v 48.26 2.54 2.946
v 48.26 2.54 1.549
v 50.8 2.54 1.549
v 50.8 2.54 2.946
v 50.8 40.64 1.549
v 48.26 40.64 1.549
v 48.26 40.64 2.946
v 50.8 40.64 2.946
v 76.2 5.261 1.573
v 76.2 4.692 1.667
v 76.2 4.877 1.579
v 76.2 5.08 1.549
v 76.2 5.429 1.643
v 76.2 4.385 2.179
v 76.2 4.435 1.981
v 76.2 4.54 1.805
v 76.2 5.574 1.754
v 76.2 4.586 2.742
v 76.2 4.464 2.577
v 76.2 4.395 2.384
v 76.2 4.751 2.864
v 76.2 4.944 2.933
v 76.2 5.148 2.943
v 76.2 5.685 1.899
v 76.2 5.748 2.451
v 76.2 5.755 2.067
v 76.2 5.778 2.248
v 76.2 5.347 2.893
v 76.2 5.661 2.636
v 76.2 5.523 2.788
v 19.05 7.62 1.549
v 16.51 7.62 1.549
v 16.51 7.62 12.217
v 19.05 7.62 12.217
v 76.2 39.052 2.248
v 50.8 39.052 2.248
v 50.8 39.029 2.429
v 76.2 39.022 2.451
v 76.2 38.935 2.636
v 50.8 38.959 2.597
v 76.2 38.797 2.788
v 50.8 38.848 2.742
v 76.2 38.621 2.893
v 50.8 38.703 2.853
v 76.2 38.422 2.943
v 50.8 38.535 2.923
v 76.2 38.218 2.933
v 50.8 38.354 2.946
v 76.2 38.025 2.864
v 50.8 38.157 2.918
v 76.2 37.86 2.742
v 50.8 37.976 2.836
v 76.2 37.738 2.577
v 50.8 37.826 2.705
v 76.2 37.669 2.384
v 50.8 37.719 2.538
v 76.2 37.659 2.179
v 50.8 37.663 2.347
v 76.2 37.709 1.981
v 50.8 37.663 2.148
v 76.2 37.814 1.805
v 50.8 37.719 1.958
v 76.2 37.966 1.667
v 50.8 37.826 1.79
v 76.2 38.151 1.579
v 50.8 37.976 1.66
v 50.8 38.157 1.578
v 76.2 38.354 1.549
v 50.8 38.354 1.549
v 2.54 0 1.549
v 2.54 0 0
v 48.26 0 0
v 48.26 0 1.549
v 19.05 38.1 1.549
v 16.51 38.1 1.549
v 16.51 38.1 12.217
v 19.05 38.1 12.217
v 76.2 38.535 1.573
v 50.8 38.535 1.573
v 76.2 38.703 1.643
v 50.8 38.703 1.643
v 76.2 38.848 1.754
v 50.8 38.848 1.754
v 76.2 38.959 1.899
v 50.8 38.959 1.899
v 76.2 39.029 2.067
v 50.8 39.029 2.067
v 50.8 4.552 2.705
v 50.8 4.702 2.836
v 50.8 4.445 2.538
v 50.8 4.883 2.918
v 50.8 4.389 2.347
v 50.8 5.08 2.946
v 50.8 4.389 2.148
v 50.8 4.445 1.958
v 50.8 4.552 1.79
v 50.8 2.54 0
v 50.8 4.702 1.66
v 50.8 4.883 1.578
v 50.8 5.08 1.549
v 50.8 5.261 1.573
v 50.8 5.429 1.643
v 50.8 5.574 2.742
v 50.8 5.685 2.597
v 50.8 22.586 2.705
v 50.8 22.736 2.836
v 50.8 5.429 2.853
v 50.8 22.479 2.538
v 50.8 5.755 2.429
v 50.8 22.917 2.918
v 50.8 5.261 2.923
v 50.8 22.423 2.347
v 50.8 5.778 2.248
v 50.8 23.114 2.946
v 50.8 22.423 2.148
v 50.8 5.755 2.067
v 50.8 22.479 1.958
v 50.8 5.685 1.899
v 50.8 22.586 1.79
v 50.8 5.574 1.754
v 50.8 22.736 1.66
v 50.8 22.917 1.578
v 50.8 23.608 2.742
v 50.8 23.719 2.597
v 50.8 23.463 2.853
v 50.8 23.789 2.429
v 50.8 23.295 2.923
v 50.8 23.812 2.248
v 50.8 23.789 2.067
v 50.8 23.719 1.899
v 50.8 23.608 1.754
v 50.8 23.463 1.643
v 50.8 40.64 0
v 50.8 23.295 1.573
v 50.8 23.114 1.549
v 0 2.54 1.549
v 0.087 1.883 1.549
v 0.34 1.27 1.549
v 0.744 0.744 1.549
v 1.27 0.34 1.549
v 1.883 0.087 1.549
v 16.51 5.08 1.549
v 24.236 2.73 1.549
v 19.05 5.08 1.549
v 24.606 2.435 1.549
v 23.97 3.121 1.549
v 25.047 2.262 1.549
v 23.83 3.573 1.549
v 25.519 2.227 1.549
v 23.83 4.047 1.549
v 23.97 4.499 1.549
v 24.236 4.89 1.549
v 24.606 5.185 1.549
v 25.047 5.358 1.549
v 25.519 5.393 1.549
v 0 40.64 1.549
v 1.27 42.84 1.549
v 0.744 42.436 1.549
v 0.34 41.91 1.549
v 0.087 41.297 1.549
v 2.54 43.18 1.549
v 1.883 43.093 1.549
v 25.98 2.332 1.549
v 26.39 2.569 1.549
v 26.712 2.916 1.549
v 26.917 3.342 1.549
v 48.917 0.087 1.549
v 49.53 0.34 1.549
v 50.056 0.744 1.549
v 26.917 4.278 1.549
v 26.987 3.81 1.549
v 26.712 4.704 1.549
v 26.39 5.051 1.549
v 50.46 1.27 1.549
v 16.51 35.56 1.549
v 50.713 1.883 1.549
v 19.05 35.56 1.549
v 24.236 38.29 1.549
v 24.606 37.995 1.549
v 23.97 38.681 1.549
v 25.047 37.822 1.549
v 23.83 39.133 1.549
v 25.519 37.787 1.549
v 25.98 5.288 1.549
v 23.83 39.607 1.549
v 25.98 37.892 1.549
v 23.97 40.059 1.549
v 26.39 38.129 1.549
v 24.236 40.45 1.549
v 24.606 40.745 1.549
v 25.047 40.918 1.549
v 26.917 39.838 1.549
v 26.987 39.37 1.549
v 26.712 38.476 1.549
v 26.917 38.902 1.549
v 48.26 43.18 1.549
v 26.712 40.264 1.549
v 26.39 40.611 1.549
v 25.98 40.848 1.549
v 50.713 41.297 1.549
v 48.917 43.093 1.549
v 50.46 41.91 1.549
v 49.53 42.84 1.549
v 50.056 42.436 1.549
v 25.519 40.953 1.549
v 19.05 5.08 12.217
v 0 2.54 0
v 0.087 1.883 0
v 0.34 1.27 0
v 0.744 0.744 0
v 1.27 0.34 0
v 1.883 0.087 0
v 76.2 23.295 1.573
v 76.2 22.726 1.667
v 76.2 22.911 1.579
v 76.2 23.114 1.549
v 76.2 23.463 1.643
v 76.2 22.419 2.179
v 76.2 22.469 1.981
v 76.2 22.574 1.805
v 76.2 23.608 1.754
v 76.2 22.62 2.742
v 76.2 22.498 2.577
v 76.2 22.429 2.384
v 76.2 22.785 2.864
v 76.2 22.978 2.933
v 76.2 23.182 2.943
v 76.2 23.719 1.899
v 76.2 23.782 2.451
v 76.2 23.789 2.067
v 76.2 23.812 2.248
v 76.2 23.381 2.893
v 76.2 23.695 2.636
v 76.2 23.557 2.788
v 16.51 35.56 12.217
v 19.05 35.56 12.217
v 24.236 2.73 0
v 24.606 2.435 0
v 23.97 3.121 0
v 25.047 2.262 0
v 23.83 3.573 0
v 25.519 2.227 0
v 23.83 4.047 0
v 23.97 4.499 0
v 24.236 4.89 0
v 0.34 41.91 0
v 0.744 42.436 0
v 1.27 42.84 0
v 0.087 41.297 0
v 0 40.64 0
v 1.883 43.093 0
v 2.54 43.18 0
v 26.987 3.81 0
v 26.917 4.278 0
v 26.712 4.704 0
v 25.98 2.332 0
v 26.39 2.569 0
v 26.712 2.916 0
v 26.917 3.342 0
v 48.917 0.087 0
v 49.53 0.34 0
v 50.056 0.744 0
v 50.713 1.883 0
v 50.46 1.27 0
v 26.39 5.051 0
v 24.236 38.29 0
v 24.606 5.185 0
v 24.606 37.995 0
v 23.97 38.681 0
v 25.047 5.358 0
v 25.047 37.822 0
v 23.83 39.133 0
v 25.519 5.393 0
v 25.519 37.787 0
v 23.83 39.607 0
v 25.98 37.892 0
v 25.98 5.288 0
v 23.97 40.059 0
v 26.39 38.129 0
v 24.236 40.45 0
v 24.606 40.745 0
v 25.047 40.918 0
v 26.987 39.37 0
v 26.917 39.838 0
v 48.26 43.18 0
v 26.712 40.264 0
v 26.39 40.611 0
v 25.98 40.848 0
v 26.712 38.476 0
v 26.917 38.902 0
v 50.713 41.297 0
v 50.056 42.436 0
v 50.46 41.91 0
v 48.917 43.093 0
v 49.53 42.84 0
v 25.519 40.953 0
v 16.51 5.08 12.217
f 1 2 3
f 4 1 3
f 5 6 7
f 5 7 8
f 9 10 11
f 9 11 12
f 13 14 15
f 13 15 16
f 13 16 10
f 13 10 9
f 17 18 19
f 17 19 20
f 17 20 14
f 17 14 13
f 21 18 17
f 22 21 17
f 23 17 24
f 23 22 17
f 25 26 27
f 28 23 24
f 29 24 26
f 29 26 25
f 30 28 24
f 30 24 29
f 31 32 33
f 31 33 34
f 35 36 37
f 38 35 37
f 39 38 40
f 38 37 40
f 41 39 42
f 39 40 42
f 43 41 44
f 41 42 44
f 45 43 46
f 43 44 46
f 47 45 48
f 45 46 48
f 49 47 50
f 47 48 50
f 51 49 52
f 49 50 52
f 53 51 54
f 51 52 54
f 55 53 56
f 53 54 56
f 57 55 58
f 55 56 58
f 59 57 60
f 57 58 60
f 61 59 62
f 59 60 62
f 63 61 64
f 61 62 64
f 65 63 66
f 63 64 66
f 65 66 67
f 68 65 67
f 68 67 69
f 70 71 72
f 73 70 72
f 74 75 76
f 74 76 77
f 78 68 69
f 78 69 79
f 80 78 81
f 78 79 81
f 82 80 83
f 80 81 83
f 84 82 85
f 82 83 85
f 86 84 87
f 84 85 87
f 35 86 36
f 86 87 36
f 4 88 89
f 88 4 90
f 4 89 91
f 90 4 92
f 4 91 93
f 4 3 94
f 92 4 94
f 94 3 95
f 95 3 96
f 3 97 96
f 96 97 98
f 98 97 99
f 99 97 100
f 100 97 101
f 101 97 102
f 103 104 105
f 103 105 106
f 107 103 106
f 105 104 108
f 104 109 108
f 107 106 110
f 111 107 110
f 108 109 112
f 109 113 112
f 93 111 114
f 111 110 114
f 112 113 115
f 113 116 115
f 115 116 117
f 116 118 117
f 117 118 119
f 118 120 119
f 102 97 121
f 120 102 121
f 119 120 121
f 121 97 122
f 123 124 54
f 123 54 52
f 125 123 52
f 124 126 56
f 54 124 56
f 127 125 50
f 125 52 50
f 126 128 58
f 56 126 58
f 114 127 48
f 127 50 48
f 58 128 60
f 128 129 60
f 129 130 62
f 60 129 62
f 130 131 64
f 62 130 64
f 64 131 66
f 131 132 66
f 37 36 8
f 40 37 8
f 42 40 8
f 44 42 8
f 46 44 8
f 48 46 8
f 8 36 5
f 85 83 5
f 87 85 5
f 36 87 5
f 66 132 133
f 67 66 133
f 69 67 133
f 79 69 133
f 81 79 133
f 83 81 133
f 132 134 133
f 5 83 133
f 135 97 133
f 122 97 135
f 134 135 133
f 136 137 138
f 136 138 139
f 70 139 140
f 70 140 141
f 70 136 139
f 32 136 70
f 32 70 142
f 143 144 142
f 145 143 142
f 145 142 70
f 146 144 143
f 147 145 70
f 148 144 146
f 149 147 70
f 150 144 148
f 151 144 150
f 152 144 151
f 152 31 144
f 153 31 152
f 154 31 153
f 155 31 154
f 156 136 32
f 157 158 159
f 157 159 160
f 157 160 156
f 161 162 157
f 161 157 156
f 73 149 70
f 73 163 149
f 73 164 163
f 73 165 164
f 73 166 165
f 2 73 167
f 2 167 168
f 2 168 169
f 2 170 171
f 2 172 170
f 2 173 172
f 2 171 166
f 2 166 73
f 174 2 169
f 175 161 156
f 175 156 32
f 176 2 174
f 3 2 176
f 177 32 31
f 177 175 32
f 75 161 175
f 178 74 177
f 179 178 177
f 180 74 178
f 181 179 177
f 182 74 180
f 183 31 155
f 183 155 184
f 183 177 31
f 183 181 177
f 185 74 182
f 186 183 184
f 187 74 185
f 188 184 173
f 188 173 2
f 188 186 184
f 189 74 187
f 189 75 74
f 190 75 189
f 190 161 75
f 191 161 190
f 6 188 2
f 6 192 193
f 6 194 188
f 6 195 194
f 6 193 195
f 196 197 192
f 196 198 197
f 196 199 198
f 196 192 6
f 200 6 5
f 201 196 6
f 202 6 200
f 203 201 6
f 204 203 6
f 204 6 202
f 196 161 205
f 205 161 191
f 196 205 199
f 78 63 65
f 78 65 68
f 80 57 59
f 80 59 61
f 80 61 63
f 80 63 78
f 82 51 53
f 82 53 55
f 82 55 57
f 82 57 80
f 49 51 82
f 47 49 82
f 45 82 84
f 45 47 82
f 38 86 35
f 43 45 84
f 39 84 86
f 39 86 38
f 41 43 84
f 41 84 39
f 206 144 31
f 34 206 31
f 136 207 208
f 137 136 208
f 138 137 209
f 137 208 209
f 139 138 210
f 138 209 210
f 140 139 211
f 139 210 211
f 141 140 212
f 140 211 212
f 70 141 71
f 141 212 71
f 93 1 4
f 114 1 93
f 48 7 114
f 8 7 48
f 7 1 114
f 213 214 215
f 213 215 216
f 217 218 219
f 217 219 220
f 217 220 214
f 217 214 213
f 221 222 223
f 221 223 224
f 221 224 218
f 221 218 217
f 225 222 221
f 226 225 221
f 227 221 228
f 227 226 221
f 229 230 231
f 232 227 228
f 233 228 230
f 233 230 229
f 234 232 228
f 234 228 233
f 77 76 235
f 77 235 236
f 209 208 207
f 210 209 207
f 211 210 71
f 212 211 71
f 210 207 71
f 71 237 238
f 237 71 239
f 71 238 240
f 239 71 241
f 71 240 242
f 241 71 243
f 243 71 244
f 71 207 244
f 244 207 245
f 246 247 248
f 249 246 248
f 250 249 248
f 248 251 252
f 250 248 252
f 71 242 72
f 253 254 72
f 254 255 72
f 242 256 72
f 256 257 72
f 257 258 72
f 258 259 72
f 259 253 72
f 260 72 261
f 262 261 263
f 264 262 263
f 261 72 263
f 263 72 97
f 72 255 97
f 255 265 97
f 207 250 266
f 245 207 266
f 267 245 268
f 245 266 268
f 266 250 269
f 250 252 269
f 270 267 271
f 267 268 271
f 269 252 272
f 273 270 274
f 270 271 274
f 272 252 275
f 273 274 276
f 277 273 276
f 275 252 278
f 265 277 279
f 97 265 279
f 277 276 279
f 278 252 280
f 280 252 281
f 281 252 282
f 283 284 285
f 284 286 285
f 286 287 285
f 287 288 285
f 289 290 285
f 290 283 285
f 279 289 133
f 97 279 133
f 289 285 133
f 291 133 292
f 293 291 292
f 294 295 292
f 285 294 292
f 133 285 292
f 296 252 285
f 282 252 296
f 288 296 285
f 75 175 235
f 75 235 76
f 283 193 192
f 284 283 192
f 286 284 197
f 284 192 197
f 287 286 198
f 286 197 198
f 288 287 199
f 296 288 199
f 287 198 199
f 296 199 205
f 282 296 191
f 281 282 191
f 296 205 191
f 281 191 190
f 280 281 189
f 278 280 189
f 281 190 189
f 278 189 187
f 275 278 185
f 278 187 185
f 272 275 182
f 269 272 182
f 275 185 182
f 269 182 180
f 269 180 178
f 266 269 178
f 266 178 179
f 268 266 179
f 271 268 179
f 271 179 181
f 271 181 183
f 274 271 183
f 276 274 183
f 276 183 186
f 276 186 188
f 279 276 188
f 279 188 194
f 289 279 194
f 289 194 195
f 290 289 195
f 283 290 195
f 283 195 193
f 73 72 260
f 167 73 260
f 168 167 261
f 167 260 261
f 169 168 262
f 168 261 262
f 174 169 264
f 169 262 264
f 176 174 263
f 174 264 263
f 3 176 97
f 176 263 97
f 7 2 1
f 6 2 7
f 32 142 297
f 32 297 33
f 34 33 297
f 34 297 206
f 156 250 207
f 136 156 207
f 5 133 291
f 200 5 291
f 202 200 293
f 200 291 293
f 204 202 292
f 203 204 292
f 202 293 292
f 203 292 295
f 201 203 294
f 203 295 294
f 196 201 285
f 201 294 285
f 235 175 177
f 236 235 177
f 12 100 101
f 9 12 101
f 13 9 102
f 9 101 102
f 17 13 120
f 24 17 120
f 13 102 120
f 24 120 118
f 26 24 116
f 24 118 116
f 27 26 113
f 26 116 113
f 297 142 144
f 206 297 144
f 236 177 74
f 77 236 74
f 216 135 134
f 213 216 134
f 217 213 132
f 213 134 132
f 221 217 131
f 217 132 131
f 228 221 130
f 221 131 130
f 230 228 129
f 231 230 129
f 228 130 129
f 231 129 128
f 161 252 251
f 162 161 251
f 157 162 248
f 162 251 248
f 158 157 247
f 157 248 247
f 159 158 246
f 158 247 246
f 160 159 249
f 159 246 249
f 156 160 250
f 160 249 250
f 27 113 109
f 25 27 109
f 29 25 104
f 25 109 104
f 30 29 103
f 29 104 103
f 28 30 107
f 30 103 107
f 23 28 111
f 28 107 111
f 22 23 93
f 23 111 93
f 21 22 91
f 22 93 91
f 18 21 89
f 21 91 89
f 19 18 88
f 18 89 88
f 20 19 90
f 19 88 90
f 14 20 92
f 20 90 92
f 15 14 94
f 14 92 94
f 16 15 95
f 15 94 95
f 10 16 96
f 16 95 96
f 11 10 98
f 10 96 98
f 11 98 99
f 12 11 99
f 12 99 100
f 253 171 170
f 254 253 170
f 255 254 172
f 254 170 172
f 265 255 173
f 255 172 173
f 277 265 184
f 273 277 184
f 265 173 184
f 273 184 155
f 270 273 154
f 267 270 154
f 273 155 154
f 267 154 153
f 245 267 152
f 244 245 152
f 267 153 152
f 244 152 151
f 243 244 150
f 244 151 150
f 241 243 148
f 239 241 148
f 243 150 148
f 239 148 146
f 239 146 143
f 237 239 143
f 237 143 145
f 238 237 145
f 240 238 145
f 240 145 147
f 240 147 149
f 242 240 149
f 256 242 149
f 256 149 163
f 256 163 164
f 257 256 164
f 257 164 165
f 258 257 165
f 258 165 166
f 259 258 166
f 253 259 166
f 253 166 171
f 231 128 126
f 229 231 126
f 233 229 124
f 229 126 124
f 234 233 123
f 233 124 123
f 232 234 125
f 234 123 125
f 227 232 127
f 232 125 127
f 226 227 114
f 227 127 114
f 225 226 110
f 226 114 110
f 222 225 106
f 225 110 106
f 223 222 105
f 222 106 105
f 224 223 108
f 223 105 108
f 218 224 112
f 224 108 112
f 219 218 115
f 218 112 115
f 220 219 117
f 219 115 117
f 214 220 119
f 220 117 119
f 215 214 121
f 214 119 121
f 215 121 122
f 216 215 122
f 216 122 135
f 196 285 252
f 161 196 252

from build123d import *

# Parameters (mm, degrees)
F1_DEPTH = 1.5494
F2_R     = 1.5875
F3_DEPTH = 25.4
F4_W     = 2.54
F4_H     = 2.54
F5_DEPTH = 10.668
F7_W     = 2.54
F7_H     = 38.1
F8_DEPTH = 1.397
F9_DEPTH = 25.4


with BuildPart() as f1:
    # F0 (on Top) → F1 (new body)
    with BuildSketch(Plane.XY):
        with BuildLine():
            ThreePointArc((0, 2.54), (0.743949, 0.743949), (2.54, 0))
            Line((2.54, 0), (48.26, 0))
            ThreePointArc((48.26, 0), (50.056051, 0.743949), (50.8, 2.54))
            Line((50.8, 2.54), (50.8, 40.64))
            ThreePointArc((50.8, 40.64), (50.056051, 42.436051), (48.26, 43.18))
            Line((48.26, 43.18), (2.54, 43.18))
            ThreePointArc((2.54, 43.18), (0.743949, 42.436051), (0, 40.64))
            Line((0, 40.64), (0, 2.54))
        make_face()
    extrude(amount=F1_DEPTH)

    # F2 (on face) → F3 (cut)
    with BuildSketch(Plane.XY.offset(1.5494)):
        with Locations((25.4, 39.37)):
            Circle(F2_R)
        with Locations((25.4, 3.81)):
            Circle(F2_R)
    extrude(amount=-F3_DEPTH, mode=Mode.SUBTRACT)

    # F4 (on face) → F5 (join)
    with BuildSketch(Plane.XY.offset(1.5494)):
        with Locations((17.78, 36.83)):
            Rectangle(F4_W, F4_H)
        with Locations((17.78, 6.35)):
            Rectangle(F4_W, F4_H)
    extrude(amount=F5_DEPTH)

    # F7 (on face) → F8 (join)
    with BuildSketch(Plane.XY.offset(1.5494)):
        with Locations((49.53, 21.59)):
            Rectangle(F7_W, F7_H)
    extrude(amount=F8_DEPTH)

    # F6 (on face) → F9 (join)
    with BuildSketch(Plane.YZ.offset(50.8)):
        with BuildLine():
            ThreePointArc((5.08, 1.5494), (5.573914, 1.753986), (5.7785, 2.2479))
            ThreePointArc((5.7785, 2.2479), (4.586086, 2.741814), (5.08, 1.5494))
        make_face()
        with BuildLine():
            ThreePointArc((23.8125, 2.2479), (22.620086, 2.741814), (23.114, 1.5494))
            ThreePointArc((23.114, 1.5494), (23.607914, 1.753986), (23.8125, 2.2479))
        make_face()
        with BuildLine():
            ThreePointArc((39.0525, 2.2479), (37.860086, 2.741814), (38.354, 1.5494))
            ThreePointArc((38.354, 1.5494), (38.847914, 1.753986), (39.0525, 2.2479))
        make_face()
    extrude(amount=F9_DEPTH)


solid = f1.part
